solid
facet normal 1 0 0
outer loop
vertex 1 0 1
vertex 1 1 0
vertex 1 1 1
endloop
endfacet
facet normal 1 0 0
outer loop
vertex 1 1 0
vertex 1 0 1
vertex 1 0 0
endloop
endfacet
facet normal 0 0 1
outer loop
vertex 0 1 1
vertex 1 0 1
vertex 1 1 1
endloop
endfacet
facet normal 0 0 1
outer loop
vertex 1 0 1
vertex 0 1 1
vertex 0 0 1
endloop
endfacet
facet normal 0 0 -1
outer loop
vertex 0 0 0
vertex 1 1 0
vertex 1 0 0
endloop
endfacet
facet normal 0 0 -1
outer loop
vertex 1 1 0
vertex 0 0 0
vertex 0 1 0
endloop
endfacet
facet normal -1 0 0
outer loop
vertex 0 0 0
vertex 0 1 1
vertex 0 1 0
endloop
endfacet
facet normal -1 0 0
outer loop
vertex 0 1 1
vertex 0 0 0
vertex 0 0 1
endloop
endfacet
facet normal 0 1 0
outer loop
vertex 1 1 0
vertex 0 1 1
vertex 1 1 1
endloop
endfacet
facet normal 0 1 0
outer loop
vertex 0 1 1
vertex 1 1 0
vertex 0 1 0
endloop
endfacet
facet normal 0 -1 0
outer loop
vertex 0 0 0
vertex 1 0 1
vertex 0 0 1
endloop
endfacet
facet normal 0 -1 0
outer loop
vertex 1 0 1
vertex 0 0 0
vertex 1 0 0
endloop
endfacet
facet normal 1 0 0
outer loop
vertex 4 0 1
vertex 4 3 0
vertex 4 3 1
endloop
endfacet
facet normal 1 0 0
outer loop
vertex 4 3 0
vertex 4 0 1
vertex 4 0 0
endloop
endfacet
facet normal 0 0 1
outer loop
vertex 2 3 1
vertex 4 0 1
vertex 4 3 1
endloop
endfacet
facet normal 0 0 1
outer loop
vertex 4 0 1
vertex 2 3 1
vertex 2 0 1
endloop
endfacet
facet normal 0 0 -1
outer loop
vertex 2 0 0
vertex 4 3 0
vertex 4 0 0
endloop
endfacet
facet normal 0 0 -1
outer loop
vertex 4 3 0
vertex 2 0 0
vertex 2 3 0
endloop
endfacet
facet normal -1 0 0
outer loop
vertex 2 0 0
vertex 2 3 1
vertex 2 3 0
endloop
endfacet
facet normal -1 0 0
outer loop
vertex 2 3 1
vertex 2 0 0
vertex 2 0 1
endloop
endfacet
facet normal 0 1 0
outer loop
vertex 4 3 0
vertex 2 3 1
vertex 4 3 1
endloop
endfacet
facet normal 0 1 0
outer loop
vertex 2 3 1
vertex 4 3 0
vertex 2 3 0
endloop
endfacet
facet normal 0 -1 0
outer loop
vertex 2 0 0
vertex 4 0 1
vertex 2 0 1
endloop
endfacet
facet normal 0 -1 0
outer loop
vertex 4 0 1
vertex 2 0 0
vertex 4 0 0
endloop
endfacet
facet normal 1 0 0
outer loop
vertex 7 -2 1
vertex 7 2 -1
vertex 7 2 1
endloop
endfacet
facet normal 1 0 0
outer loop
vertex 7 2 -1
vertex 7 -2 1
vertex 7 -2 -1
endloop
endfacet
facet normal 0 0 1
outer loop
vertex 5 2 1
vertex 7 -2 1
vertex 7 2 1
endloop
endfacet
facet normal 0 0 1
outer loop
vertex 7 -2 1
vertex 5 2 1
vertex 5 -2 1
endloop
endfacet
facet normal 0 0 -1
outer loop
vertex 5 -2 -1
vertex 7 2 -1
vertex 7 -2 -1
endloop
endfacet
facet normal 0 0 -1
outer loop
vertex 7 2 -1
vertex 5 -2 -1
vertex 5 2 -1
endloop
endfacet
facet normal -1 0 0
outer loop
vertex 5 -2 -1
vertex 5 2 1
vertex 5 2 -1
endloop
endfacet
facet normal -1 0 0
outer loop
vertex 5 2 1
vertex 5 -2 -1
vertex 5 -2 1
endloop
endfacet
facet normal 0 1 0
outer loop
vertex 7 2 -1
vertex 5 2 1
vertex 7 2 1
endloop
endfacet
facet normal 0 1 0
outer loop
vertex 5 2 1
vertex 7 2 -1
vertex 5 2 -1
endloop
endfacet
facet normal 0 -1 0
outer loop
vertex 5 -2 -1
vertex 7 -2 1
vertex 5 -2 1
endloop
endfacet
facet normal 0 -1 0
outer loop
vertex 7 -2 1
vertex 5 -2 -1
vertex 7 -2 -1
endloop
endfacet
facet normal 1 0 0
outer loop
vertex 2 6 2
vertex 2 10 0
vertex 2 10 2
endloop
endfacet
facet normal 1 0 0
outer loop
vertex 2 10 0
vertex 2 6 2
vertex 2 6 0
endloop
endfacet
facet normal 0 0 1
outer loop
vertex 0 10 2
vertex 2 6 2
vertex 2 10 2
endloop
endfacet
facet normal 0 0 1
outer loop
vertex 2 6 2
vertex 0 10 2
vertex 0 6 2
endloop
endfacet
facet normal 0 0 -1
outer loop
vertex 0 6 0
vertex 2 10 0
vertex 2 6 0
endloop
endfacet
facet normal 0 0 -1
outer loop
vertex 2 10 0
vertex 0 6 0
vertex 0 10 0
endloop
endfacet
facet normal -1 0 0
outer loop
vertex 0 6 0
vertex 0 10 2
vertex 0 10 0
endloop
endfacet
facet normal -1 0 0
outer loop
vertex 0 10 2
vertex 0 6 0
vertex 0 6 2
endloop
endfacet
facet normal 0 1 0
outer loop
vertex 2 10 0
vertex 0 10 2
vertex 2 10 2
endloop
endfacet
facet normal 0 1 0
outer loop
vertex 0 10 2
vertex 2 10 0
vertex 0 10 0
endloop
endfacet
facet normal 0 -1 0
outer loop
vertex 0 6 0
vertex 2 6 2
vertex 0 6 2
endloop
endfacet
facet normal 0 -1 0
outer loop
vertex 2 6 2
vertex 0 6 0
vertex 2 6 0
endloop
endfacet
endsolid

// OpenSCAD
cube();
cube([1,1,0]); cube([1,0,1]); cube([0,1,1]); cube([0,0,0]);
translate([2,0,0]) cube([2,3,1]);
translate([6,0,0]) cube([2,4,2], center=true);
translate([0,6,0]) cube([2,4,2], center=[true, true, false]);
